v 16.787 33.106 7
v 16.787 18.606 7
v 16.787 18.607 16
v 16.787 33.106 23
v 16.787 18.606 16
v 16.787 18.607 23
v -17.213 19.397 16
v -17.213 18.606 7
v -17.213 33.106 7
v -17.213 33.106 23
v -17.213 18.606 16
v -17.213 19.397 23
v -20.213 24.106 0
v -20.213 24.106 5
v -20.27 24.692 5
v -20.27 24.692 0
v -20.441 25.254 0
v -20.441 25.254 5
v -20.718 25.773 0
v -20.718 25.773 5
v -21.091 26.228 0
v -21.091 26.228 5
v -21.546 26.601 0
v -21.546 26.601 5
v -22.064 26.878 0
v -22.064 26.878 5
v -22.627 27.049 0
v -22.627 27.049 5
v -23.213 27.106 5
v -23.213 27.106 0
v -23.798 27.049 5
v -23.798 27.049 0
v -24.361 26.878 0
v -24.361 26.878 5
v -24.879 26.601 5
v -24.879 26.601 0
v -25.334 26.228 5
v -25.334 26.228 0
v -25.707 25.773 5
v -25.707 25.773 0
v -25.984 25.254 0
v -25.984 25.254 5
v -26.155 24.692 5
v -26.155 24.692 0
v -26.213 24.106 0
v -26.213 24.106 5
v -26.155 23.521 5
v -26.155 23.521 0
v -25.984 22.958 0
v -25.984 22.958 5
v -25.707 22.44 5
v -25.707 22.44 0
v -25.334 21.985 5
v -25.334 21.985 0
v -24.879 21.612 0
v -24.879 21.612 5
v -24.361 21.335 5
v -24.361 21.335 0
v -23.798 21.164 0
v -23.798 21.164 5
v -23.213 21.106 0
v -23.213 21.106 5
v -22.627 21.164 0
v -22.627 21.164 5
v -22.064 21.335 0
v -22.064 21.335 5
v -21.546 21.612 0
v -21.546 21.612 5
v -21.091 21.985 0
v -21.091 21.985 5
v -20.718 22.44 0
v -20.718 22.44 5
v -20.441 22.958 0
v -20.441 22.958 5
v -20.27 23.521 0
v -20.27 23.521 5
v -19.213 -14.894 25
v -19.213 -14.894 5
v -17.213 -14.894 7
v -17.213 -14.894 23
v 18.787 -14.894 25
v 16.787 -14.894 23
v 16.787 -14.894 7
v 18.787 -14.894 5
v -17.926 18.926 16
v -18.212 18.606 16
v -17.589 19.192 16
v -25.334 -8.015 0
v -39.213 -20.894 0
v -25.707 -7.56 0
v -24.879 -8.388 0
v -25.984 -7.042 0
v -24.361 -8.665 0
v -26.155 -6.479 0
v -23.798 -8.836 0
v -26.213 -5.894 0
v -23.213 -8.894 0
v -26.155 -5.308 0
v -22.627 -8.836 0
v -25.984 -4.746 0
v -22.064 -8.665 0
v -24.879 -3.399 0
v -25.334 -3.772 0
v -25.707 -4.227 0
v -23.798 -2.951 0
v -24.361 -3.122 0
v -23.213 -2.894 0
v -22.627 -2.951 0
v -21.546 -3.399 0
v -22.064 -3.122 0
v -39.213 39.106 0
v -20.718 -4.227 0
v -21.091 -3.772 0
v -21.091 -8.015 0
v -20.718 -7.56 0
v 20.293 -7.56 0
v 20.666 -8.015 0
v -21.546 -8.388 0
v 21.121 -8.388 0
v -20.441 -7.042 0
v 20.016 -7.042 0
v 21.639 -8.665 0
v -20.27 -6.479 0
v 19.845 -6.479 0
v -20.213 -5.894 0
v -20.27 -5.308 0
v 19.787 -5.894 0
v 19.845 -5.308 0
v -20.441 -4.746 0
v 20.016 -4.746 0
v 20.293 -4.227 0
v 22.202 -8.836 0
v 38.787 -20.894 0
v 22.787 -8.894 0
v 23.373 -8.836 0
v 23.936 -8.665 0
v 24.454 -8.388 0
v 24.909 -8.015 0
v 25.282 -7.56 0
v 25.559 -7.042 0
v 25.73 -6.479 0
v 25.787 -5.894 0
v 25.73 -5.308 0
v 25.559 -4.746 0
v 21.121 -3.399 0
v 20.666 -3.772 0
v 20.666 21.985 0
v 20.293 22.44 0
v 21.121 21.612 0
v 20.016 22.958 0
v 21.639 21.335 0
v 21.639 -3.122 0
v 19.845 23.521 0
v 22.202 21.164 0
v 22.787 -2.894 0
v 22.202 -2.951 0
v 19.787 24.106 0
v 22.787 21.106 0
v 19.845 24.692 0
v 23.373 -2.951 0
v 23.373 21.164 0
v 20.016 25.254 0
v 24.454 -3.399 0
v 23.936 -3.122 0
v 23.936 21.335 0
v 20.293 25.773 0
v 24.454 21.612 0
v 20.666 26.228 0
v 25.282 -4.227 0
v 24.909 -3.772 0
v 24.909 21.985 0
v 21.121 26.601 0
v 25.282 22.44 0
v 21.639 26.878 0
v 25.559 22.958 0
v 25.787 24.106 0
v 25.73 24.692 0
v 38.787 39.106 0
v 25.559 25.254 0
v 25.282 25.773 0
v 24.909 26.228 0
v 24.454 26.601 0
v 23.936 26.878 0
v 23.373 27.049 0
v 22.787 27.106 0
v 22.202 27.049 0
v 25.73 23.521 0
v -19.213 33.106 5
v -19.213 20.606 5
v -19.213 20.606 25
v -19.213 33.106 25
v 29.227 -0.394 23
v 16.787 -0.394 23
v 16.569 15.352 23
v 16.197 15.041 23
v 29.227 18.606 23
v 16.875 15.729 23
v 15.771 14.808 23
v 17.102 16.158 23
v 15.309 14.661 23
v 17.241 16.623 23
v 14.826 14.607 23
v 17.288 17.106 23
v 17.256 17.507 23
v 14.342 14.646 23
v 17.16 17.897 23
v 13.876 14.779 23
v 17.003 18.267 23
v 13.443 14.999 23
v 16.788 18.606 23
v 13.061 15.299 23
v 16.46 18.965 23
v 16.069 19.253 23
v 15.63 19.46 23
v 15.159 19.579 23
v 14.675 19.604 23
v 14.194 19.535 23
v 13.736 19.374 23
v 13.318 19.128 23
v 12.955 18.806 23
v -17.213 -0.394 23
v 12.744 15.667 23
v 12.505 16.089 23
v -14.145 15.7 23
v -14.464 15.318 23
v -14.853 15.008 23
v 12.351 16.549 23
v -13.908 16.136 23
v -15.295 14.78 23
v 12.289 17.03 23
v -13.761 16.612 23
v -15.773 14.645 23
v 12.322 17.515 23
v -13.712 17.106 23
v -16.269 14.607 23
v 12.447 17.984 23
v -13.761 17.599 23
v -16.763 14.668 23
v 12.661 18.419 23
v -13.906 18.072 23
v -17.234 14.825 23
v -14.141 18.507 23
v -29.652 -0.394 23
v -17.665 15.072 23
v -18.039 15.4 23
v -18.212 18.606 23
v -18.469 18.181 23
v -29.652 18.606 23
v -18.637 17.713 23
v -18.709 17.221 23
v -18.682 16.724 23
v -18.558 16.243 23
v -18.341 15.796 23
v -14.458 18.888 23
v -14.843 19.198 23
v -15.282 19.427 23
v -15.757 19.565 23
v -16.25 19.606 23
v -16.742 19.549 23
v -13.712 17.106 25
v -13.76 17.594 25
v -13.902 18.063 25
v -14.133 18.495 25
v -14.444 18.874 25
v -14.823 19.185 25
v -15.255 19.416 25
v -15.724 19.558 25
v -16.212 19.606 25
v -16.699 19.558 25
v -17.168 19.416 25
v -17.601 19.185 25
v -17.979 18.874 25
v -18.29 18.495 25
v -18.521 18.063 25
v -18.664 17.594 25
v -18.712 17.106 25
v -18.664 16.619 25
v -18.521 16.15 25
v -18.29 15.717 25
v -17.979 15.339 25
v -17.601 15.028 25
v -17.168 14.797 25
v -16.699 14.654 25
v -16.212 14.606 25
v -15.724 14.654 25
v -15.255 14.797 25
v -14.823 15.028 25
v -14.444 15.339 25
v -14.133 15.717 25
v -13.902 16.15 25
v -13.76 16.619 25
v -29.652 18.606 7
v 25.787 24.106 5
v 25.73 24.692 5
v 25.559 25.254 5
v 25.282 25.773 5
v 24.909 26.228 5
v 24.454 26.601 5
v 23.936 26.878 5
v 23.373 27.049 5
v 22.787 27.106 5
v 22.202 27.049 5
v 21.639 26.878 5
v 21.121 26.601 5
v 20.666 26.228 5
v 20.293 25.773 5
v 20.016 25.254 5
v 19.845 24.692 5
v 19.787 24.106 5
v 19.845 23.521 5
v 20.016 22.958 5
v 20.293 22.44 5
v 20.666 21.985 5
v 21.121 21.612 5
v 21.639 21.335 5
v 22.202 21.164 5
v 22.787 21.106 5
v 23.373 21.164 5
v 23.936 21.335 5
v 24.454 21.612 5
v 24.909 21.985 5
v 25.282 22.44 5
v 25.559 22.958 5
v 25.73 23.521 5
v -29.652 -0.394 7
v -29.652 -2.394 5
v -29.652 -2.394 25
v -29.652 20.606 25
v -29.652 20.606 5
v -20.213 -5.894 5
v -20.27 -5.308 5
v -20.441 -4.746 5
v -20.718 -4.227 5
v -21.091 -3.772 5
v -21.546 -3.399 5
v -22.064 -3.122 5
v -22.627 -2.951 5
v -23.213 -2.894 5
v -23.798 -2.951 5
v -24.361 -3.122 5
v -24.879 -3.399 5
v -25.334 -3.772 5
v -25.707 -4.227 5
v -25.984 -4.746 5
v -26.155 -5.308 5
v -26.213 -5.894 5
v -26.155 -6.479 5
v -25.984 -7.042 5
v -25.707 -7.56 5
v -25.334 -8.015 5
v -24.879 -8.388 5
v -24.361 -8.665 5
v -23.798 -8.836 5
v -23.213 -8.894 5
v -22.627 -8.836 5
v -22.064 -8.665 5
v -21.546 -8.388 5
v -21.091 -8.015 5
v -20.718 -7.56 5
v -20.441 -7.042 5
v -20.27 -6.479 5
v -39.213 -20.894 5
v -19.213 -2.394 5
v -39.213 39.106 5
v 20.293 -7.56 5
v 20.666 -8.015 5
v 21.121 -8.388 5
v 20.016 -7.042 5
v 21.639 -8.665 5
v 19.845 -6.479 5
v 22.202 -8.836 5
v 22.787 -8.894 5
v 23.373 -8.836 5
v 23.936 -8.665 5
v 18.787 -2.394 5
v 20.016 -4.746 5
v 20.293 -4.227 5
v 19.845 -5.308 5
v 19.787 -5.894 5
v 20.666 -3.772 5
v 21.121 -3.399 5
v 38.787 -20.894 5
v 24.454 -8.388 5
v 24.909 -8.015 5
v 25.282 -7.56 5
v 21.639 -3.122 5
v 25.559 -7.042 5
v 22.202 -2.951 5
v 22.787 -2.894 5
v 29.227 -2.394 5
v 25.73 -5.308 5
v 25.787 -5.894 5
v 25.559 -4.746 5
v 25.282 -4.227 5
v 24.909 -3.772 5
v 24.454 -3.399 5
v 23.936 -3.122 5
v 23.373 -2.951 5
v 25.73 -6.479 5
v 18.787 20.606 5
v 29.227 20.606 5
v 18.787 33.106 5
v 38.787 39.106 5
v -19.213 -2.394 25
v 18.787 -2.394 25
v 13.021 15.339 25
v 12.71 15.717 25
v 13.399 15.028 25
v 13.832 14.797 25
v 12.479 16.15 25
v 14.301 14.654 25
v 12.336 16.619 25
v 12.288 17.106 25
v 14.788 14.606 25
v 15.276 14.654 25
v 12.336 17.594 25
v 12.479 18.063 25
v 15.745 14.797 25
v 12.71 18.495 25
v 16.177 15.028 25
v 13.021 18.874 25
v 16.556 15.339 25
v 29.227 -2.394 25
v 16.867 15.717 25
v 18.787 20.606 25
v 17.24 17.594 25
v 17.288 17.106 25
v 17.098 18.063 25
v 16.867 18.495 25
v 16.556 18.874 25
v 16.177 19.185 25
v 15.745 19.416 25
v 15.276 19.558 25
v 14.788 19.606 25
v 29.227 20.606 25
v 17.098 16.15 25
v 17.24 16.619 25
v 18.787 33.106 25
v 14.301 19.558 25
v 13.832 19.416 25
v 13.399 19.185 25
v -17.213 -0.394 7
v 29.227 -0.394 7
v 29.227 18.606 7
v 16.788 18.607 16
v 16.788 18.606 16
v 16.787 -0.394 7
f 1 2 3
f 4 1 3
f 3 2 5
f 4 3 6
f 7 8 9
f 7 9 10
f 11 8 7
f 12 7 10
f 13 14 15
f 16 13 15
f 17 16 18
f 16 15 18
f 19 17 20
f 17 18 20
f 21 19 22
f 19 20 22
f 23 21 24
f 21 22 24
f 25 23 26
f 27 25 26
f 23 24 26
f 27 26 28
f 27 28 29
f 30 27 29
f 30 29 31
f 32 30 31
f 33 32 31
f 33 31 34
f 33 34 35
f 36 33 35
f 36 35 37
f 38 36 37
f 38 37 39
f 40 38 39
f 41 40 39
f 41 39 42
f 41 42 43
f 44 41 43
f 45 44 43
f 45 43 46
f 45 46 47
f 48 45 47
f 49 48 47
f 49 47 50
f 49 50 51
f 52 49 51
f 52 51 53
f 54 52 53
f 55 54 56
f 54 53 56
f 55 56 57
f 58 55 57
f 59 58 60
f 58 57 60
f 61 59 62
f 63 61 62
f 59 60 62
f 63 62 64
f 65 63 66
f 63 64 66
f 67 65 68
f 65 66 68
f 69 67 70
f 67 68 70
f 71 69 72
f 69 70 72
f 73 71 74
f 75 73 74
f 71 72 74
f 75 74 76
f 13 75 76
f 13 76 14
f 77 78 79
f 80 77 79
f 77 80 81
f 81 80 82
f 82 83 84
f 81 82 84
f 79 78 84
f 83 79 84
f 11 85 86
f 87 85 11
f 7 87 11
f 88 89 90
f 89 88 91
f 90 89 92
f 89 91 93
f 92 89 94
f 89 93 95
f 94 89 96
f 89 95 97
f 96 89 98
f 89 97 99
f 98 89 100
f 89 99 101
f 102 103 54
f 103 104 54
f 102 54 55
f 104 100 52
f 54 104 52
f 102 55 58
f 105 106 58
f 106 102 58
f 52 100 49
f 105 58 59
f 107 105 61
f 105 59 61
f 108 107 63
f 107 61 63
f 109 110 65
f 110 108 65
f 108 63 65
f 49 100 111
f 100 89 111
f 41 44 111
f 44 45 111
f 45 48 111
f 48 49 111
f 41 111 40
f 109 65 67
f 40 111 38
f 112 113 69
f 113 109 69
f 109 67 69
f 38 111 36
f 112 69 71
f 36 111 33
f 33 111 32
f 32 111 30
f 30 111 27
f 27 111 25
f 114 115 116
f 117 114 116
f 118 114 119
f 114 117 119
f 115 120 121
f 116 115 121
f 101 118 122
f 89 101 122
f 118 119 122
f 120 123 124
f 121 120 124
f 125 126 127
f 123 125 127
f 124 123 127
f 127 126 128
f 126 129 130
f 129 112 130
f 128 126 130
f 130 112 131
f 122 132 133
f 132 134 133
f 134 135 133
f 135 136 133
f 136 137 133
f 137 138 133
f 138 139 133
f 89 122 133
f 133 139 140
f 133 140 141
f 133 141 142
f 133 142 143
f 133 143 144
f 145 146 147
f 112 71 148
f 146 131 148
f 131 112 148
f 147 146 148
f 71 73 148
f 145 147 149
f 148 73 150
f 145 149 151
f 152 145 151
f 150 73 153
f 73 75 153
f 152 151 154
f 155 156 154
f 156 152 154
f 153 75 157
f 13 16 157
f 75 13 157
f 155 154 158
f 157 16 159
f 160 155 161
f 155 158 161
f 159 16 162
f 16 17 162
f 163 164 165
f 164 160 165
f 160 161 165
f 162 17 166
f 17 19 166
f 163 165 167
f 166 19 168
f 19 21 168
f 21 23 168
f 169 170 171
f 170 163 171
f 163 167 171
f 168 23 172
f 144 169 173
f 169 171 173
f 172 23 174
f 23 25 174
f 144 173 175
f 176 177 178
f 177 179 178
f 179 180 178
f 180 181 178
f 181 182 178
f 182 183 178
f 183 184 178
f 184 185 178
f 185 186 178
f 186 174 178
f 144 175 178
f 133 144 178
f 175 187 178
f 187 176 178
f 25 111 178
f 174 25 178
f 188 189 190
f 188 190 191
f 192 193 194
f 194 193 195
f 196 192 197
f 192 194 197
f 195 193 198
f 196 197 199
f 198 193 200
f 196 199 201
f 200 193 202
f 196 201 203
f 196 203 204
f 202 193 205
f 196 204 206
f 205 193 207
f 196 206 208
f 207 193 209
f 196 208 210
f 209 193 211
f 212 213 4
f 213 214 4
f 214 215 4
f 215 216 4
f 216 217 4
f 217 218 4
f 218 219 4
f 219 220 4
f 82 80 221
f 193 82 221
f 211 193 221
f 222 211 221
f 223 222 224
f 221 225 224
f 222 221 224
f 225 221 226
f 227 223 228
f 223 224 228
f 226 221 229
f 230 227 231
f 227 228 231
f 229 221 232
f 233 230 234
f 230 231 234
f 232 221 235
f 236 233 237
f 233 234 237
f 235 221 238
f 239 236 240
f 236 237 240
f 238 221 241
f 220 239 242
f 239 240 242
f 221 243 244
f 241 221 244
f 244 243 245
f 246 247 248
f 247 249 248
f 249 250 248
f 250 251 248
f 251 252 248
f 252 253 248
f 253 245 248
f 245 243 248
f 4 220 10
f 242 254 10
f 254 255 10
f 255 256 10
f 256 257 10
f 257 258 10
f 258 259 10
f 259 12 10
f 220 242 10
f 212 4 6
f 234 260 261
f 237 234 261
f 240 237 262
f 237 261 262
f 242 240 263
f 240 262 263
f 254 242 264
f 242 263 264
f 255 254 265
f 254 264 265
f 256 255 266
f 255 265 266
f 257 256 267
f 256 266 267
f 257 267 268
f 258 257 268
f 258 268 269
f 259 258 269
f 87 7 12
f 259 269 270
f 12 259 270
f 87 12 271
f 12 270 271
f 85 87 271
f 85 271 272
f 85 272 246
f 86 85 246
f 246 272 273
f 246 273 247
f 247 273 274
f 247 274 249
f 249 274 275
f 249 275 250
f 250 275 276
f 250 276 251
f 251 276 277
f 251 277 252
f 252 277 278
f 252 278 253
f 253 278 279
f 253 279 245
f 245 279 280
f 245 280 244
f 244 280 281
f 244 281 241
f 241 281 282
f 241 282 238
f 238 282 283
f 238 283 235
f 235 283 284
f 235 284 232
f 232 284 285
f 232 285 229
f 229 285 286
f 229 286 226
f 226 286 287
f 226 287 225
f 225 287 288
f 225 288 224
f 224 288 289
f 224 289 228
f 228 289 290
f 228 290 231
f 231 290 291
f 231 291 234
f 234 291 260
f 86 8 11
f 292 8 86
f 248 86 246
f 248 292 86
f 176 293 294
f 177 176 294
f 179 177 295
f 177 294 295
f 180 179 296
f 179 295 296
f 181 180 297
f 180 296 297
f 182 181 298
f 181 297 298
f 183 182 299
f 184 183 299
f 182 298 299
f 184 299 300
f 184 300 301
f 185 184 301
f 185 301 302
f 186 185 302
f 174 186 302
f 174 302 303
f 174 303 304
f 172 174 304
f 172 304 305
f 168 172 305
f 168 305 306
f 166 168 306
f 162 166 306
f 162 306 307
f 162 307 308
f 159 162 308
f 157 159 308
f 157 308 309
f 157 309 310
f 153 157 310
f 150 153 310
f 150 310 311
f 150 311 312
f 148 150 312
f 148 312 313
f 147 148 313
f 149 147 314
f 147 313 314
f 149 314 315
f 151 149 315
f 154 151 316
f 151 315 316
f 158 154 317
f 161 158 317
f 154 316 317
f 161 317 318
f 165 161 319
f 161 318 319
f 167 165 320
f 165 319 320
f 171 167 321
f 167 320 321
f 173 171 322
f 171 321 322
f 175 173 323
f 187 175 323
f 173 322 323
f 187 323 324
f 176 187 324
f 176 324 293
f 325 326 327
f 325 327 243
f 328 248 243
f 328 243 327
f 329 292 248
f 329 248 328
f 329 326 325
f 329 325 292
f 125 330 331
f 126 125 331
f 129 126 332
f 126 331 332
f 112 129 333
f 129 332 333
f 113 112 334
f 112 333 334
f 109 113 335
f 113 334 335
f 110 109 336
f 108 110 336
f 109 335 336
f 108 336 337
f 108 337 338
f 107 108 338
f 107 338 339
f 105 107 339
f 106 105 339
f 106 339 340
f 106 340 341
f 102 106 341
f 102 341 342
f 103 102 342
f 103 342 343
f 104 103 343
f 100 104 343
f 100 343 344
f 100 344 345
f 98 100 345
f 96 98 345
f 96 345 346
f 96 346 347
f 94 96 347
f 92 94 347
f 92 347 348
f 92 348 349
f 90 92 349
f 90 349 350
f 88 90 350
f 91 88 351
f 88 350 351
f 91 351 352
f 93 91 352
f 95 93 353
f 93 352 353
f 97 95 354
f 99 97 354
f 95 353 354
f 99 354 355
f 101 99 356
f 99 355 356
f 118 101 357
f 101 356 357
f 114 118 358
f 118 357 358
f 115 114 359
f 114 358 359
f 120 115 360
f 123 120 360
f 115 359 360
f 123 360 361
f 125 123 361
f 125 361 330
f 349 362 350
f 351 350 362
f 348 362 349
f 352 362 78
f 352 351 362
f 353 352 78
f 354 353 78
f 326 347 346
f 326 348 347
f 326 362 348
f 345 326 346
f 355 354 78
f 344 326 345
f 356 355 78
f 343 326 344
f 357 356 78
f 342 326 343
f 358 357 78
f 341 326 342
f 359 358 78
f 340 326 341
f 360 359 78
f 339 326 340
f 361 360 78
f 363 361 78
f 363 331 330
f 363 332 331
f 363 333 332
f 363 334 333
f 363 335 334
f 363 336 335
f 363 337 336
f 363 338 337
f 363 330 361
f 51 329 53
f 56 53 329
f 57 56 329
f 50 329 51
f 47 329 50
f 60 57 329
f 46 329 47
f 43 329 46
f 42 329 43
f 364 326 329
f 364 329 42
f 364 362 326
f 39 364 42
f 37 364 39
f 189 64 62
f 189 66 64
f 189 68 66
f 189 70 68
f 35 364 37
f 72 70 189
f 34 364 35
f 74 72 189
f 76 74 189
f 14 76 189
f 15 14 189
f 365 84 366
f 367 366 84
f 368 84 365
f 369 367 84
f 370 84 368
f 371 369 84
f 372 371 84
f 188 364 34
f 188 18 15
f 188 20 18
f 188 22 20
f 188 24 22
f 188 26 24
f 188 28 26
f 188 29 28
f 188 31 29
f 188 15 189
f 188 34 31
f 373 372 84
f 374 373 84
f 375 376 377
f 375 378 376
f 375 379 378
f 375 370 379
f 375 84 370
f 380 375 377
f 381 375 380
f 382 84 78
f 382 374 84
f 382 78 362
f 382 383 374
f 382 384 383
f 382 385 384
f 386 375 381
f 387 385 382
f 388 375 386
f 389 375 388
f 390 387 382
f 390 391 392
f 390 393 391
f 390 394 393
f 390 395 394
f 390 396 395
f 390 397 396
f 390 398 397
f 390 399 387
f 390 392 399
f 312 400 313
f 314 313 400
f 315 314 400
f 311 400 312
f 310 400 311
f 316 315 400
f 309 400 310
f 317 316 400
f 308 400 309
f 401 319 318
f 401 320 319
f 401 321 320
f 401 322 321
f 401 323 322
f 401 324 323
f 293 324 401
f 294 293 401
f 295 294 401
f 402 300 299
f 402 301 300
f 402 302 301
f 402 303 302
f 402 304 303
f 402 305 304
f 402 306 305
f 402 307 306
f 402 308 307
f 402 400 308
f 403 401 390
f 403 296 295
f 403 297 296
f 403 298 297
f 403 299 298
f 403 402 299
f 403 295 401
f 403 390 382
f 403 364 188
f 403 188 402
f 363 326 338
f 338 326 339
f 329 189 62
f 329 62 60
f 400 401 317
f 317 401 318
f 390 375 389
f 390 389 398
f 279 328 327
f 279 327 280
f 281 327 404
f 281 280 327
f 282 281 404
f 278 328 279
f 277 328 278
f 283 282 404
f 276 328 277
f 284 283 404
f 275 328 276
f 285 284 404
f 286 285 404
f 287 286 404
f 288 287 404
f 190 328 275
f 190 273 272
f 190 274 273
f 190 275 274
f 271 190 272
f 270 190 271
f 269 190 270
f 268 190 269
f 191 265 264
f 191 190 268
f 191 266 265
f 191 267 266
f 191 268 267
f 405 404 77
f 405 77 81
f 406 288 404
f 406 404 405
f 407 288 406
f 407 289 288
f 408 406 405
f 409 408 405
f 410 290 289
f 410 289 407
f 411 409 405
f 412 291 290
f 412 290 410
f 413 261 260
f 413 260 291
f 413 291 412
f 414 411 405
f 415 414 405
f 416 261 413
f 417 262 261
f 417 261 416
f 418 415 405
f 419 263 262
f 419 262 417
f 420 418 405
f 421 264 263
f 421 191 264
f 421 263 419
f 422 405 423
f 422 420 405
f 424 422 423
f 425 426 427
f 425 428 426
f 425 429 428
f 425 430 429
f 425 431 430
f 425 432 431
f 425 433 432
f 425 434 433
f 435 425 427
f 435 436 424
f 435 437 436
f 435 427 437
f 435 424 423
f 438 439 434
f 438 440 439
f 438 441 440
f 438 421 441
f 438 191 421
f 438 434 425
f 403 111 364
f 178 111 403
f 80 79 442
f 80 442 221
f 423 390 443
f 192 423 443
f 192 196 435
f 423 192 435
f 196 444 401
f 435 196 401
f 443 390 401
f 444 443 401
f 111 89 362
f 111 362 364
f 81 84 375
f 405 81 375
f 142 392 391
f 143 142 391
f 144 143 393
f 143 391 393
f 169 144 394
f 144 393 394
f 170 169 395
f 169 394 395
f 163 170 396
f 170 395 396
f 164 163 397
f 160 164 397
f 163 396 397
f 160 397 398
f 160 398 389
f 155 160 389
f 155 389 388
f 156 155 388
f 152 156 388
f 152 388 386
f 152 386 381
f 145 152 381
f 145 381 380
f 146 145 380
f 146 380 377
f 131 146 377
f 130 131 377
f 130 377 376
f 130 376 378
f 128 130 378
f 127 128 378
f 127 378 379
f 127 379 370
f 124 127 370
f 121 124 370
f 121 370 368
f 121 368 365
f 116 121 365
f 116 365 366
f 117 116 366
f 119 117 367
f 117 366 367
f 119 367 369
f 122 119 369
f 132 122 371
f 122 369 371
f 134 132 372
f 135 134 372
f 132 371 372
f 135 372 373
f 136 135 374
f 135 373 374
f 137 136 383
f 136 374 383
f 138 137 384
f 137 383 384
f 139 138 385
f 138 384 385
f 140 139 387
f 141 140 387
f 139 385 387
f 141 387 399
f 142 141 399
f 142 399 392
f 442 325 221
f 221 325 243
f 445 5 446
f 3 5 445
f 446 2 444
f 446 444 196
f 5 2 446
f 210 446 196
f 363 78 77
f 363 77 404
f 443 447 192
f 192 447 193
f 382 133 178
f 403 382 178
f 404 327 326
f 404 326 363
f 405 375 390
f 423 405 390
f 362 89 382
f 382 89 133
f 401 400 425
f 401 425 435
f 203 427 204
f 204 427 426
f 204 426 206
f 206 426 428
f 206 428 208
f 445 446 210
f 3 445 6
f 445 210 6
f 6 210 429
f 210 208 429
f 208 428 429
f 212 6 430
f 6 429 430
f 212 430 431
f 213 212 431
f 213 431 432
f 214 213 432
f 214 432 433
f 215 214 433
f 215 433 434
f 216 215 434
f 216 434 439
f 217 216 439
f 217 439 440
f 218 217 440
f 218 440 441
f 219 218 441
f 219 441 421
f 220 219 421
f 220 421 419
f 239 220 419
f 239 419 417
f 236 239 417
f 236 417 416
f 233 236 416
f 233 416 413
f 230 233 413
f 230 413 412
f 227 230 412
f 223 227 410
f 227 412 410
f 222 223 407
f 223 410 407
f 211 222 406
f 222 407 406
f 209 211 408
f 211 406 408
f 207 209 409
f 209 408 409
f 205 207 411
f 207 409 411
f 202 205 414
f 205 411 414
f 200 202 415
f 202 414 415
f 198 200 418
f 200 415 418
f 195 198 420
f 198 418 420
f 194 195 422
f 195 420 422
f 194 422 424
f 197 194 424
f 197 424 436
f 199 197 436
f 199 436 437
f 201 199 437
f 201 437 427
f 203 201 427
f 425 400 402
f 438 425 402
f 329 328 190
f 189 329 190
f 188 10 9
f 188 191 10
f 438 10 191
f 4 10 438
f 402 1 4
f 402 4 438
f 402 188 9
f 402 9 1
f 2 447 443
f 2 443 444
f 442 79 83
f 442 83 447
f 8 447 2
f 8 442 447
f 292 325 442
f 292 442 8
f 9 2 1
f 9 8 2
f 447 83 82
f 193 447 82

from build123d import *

# Parameters (mm, degrees)
SKETCH1_W           = 78
SKETCH1_H           = 60
BOSS_EXTRUDE1_DEPTH = 5
SKETCH7_R           = 3
CUT_EXTRUDE4_DEPTH  = 56.605062255
SKETCH8_W           = 38
SKETCH8_H           = 48
BOSS_EXTRUDE2_DEPTH = 20
SKETCH9_W           = 58.87856647
SKETCH9_H           = 23
BOSS_EXTRUDE3_DEPTH = 20
SKETCH10_W          = 16
SKETCH10_H          = 19
CUT_EXTRUDE5_DEPTH  = 60
SKETCH11_W          = 34
SKETCH11_H          = 16
CUT_EXTRUDE6_DEPTH  = 60
SKETCH12_R          = 2.5
CUT_EXTRUDE7_DEPTH  = 9


with BuildPart() as part:
    # Sketch1 → Boss-Extrude1 (new body)
    with BuildSketch(Plane.XY):
        with Locations((-0.21253406, 9.10626703)):
            Rectangle(SKETCH1_W, SKETCH1_H)
    extrude(amount=BOSS_EXTRUDE1_DEPTH)

    # Sketch7 → Cut-Extrude4 (cut, through all)
    with BuildSketch(Plane.XY.offset(5)):
        with Locations((-23.21253406, 24.10626703)):
            Circle(SKETCH7_R)
        with Locations((22.78746594, 24.10626703)):
            Circle(SKETCH7_R)
        with Locations((22.78746594, -5.89373297)):
            Circle(SKETCH7_R)
        with Locations((-23.21253406, -5.89373297)):
            Circle(SKETCH7_R)
    extrude(amount=-CUT_EXTRUDE4_DEPTH, mode=Mode.SUBTRACT)

    # Sketch8 → Boss-Extrude2 (add)
    with BuildSketch(Plane.XY.offset(5)):
        with Locations((-0.21253406, 9.10626703)):
            Rectangle(SKETCH8_W, SKETCH8_H)
    extrude(amount=BOSS_EXTRUDE2_DEPTH)

    # Sketch9 → Boss-Extrude3 (add)
    with BuildSketch(Plane.XY.offset(5)):
        with Locations((-0.21253406, 9.10626703)):
            Rectangle(SKETCH9_W, SKETCH9_H)
    extrude(amount=BOSS_EXTRUDE3_DEPTH)

    # Sketch10 → Cut-Extrude5 (cut)
    with BuildSketch(Plane.ZY.offset(29.651817295)):
        with Locations((15, 9.10626703)):
            Rectangle(SKETCH10_W, SKETCH10_H)
    extrude(amount=-CUT_EXTRUDE5_DEPTH, mode=Mode.SUBTRACT)

    # Sketch11 → Cut-Extrude6 (cut)
    with BuildSketch(Plane.XZ.offset(14.89373297)):
        with Locations((-0.21253406, 15)):
            Rectangle(SKETCH11_W, SKETCH11_H)
    extrude(amount=-CUT_EXTRUDE6_DEPTH, mode=Mode.SUBTRACT)

    # Sketch12 → Cut-Extrude7 (cut)
    with BuildSketch(Plane.XY.offset(25)):
        with Locations((-16.211721725, 17.10626703)):
            Circle(SKETCH12_R)
        with Locations((14.788278275, 17.10626703)):
            Circle(SKETCH12_R)
    extrude(amount=-CUT_EXTRUDE7_DEPTH, mode=Mode.SUBTRACT)


solid = part.part
